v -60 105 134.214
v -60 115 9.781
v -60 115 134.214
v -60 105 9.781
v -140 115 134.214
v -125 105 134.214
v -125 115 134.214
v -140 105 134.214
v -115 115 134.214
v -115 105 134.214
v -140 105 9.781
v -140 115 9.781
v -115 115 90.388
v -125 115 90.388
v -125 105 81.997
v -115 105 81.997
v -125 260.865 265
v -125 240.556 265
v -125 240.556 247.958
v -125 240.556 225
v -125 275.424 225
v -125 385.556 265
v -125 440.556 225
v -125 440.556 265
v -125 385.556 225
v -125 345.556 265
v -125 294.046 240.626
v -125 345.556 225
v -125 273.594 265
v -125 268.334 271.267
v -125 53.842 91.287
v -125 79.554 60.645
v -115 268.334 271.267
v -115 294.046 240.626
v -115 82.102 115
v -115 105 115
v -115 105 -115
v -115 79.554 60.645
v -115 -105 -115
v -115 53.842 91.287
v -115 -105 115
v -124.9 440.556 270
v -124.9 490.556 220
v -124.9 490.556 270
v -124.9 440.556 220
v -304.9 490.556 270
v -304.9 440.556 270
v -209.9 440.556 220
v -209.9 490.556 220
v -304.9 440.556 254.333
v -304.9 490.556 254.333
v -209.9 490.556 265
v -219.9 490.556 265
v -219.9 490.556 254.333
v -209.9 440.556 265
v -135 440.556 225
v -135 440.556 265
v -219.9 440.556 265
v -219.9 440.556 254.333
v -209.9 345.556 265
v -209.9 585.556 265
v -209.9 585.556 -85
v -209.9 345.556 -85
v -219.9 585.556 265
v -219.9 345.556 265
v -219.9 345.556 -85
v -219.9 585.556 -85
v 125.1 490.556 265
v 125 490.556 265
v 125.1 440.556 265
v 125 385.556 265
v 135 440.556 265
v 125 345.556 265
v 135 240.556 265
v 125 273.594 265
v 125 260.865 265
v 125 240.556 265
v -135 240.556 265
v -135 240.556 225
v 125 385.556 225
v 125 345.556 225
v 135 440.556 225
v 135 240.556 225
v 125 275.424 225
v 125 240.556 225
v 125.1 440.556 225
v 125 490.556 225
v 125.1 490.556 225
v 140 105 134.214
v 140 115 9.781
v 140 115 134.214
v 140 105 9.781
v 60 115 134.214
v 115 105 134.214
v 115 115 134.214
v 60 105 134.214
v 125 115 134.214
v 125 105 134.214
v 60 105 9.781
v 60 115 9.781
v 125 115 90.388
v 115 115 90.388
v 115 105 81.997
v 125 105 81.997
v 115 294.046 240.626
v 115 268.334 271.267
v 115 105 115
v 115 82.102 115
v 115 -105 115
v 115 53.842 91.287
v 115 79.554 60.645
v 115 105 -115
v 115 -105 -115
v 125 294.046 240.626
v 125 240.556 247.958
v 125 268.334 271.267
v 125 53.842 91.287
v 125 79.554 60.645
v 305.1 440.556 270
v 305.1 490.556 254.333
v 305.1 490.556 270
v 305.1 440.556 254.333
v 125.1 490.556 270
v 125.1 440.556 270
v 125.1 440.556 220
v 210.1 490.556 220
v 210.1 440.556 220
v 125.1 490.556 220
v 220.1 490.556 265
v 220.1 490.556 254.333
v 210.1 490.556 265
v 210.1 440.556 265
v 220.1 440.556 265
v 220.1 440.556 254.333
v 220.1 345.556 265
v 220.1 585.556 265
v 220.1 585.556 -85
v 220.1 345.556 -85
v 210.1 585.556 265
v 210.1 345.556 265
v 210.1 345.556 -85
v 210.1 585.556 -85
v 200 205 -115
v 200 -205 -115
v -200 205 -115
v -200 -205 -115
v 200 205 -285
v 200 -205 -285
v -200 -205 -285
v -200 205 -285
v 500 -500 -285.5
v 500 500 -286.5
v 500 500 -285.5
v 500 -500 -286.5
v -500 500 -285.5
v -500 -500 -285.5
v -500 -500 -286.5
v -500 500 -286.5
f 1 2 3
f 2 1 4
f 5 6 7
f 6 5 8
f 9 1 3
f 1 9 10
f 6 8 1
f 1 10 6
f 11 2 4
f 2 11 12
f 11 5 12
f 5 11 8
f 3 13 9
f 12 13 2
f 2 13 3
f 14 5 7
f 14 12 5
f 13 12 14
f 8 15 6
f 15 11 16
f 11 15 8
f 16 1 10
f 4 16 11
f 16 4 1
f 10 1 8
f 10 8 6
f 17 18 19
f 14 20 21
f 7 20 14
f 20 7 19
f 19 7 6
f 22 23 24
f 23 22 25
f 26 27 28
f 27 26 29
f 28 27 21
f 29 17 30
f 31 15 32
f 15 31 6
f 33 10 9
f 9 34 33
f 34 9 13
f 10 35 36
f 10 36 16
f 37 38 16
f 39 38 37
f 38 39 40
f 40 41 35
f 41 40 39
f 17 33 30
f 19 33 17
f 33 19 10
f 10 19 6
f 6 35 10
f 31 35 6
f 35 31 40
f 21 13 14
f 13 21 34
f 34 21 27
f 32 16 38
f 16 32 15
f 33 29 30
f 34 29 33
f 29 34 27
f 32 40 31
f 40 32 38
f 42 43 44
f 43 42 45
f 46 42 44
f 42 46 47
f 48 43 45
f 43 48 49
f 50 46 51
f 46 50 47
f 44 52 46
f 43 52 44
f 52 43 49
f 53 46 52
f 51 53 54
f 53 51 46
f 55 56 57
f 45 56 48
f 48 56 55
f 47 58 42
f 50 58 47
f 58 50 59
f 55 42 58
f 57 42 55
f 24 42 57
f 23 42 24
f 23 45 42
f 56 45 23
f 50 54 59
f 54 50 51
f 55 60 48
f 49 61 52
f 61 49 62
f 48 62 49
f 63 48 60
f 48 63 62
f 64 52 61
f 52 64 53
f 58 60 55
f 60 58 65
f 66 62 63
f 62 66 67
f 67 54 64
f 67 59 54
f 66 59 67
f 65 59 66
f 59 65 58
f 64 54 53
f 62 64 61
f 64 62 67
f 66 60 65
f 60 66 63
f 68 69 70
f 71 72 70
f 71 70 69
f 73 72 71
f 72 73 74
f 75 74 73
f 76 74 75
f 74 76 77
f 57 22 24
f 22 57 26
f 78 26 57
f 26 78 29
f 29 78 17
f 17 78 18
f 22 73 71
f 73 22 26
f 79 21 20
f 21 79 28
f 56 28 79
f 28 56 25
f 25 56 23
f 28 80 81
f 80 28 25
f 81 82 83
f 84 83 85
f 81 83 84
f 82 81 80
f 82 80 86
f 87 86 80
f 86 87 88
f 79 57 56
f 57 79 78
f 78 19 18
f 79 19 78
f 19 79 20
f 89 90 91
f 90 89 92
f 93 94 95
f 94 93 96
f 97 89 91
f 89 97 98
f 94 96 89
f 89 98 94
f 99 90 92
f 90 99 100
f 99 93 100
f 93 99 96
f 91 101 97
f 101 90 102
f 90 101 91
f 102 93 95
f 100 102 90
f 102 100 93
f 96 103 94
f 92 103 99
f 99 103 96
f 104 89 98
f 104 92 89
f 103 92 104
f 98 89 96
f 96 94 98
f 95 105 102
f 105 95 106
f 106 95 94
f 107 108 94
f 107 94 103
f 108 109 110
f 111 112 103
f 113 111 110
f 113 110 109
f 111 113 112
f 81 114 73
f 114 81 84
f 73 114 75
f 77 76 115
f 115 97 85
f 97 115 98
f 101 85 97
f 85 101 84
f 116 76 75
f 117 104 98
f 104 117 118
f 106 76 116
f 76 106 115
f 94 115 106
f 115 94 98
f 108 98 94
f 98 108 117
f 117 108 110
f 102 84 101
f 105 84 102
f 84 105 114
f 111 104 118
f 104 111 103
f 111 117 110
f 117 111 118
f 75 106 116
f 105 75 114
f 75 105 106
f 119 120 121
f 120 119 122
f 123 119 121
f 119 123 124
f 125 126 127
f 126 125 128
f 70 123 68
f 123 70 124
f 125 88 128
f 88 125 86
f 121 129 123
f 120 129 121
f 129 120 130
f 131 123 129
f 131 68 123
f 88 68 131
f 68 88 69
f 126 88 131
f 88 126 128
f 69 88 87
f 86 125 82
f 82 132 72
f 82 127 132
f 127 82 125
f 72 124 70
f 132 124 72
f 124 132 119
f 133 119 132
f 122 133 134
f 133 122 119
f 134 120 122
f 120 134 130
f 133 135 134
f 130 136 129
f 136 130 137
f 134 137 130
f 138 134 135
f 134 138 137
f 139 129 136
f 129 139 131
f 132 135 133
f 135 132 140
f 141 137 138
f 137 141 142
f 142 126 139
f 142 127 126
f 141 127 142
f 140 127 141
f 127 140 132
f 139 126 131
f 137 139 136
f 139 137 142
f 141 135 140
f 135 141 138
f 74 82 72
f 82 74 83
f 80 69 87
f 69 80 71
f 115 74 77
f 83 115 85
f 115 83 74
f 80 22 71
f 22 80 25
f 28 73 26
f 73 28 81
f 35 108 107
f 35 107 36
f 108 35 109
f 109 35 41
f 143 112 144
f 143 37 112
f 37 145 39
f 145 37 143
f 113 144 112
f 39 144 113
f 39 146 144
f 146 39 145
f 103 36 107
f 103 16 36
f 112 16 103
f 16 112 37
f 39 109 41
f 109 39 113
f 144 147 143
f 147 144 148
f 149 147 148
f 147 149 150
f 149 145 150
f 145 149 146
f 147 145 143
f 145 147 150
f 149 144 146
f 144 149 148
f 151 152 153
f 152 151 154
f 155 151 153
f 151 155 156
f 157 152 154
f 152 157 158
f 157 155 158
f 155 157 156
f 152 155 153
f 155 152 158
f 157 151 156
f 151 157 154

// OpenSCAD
module left_arm_new(){
    arm_x = 10;
    arm_y = 250;
    arm_z = 40;
    
    cube([arm_x,arm_y,arm_z],center=true);  
   
    x_base = 180;
    y_base = 50;
    z_base = 50; 
    
    translate([-x_base/2+arm_x/2+0.1,arm_y/2-y_base/2,0]){
    difference(){
        cube([x_base,y_base,z_base],center=true);
        translate([-x_base/2,0,-z_base/3])
            cube([x_base+2,y_base+2,z_base+2],center=true);
    }  
    ant_z = 350;
    ant_y = 240;
    ant_x = 10;
    
    dis_to_ground = 210;
    dis_to_robot = 300;

    translate([0,0,-ant_z/2+20]){
        cube([ant_x,ant_y,ant_z],center = true); 
//        translate([0,0,-ant_z/2-dis_to_ground/2])
//        cube([50,10,dis_to_ground],center=true);
//        translate([0,-ant_y/2-dis_to_robot/2,0])
//        cube([50,dis_to_robot,10],center=true);
    }
    }
}

module left_arm(){
arm_x = 10;
arm_y = 150;
arm_z = 40;
arm_angle = 20;
color("red"){
rotate([arm_angle,0,0])
cube([arm_x, arm_y, arm_z],center=true);
}

short_arm_x = 10;
short_arm_y = 100;
short_arm_z = 40;

x_base = 180;
y_base = 40;
z_base = 40;

translate([0,cos(arm_angle)*arm_y/2+short_arm_y/4,sin(arm_angle)*arm_y/2])
    cube([short_arm_x, short_arm_y, short_arm_z],center=true);

translate([-x_base/2+0.1,cos(arm_angle)*arm_y/2+short_arm_y/2,sin(arm_angle)*arm_y/2])
    difference(){
        cube([x_base,y_base,z_base],center=true);
        translate([-x_base/2,0,-z_base/3])
            cube([x_base+2,y_base+2,z_base+2],center=true);
    }   

ant_z = 350;
ant_y = 240;
ant_x = 10;
    
dis_to_ground = 200;
dis_to_robot = 300;

translate([-x_base+0.1,cos(arm_angle)*arm_y/2+short_arm_y/2,sin(arm_angle)*arm_y/2-ant_z/2+10]){
    cube([ant_x,ant_y,ant_z],center = true); 
    translate([0,0,-ant_z/2-dis_to_ground/2])
    cube([50,10,dis_to_ground],center=true);
    translate([0,-ant_y/2-dis_to_robot/2,0])
    cube([50,dis_to_robot,10],center=true);
    }
}


module right_arm_new(){
    arm_x = 10;
    arm_y = 250;
    arm_z = 40;
    
    cube([arm_x,arm_y,arm_z],center=true);  
   
    x_base = 180;
    y_base = 50;
    z_base = 50; 
    
    translate([x_base/2-arm_x/2+0.1,arm_y/2-y_base/2,0]){
    difference(){
        cube([x_base,y_base,z_base],center=true);
        translate([x_base/2,0,-z_base/3])
            cube([x_base+2,y_base+2,z_base+2],center=true);
    }  
    ant_z = 350;
    ant_y = 240;
    ant_x = 10;
    
    dis_to_ground = 210;
    dis_to_robot = 300;

    translate([0,0,-ant_z/2+20]){
        cube([ant_x,ant_y,ant_z],center = true); 
//        translate([0,0,-ant_z/2-dis_to_ground/2])
//        cube([50,10,dis_to_ground],center=true);
//        translate([0,-ant_y/2-dis_to_robot/2,0])
//        cube([50,dis_to_robot,10],center=true);
    }
    }
}

module right_arm(){
arm_x = 10;
arm_y = 150;
arm_z = 40;
arm_angle = 20;
rotate([arm_angle,0,0])
cube([arm_x, arm_y, arm_z],center=true);


short_arm_x = 10;
short_arm_y = 100;
short_arm_z = 40;

x_base = 180;
y_base = 40;
z_base = 40;

translate([0,cos(arm_angle)*arm_y/2+short_arm_y/4,sin(arm_angle)*arm_y/2])
    cube([short_arm_x, short_arm_y, short_arm_z],center=true);

translate([x_base/2-0.1,cos(arm_angle)*arm_y/2+short_arm_y/2,sin(arm_angle)*arm_y/2])
    difference(){
        cube([x_base,y_base,z_base],center=true);
        translate([x_base/2,0,-z_base/3])
            cube([x_base+2,y_base+2,z_base+2],center=true);
    }   

ant_z = 350;
ant_y = 240;
ant_x = 10;

color("blue") {
translate([x_base-0.1,cos(arm_angle)*arm_y/2+short_arm_y/2,sin(arm_angle)*arm_y/2-ant_z/2+10])
cube([ant_x,ant_y,ant_z],center = true);
}
}

module arm_extension_left(arm_x,arm_y,arm_z,attachLength,rotate_angle){
    y_tran = -(arm_y/2-attachLength)*cos(rotate_angle);
    z_tran = -(arm_y/2-attachLength)*sin(rotate_angle)-arm_z/2/cos(rotate_angle);
    translate([20,y_tran+5,z_tran-10])
    cube([80,10,arm_z/cos(rotate_angle)*2+20],center=true);
    rotate([rotate_angle,0,0])
    cube([arm_x, arm_y, arm_z],center=true); 
    
}

module arm_extension_right(arm_x,arm_y,arm_z,attachLength,rotate_angle){
    y_tran = -(arm_y/2-attachLength)*cos(rotate_angle);
    z_tran = -(arm_y/2-attachLength)*sin(rotate_angle)-arm_z/2/cos(rotate_angle);
    translate([-20,y_tran+5,z_tran-10])
    cube([80,10,arm_z/cos(rotate_angle)*2+20],center=true);
    rotate([rotate_angle,0,0])
    cube([arm_x, arm_y, arm_z],center=true); 
    
}

module reinforcementRod(x,y,z){
    cube([x,y,z],center = true);
}
//create the box
box_y = 210;
box_x = 230;
box_z = 230;
color("blue") {
//translate([box_x/2,install_position_y,-box_z/2])   
cube([box_x,box_y,box_z],center = true);
}

//create the robot
robot_z = 380-210;
robot_x = 400;
robot_y = 410;

color("red"){
translate([0,0,-(box_z+robot_z)/2])   
    cube([robot_x,robot_y,robot_z],center = true);
}

//create the ground
color("yellow"){
translate([0,0,-(box_z/2)-robot_z-1])
    cube([1000,1000,1],center=true);
}

//size of the arm extension
arm_ex_x = 10;
arm_ex_y = 280;
arm_ex_z = 40;
//the length of arm extension attaced on the box
attachLength = 50;
z_lift = 20;
//the angle between the arm extension and the box
rotate_angle=40;

y_offset = (box_y/2/cos(rotate_angle)-attachLength+arm_ex_y/2)*cos(rotate_angle);
z_offset = (box_y/2/cos(rotate_angle)-attachLength+arm_ex_y/2)*sin(rotate_angle)+z_lift;

translate([-box_x/2-arm_ex_x/2,y_offset,z_offset])
    arm_extension_left(arm_ex_x,arm_ex_y,arm_ex_z,attachLength,rotate_angle);

translate([-box_x/2-arm_ex_x/2-arm_ex_x,box_y+arm_ex_y/1.8,box_z/2+130])
    left_arm_new();

translate([box_x/2+arm_ex_x/2,y_offset,z_offset])
    arm_extension_right(arm_ex_x,arm_ex_y,arm_ex_z,attachLength,rotate_angle);

translate([box_x/2+arm_ex_x/2+arm_ex_x,box_y+arm_ex_y/1.8,box_z/2+130]){
    right_arm_new();
    translate([-box_x/2-arm_ex_x*1.5,0,0])
    reinforcementRod(box_x+arm_ex_x*2,40,40);
}
    
